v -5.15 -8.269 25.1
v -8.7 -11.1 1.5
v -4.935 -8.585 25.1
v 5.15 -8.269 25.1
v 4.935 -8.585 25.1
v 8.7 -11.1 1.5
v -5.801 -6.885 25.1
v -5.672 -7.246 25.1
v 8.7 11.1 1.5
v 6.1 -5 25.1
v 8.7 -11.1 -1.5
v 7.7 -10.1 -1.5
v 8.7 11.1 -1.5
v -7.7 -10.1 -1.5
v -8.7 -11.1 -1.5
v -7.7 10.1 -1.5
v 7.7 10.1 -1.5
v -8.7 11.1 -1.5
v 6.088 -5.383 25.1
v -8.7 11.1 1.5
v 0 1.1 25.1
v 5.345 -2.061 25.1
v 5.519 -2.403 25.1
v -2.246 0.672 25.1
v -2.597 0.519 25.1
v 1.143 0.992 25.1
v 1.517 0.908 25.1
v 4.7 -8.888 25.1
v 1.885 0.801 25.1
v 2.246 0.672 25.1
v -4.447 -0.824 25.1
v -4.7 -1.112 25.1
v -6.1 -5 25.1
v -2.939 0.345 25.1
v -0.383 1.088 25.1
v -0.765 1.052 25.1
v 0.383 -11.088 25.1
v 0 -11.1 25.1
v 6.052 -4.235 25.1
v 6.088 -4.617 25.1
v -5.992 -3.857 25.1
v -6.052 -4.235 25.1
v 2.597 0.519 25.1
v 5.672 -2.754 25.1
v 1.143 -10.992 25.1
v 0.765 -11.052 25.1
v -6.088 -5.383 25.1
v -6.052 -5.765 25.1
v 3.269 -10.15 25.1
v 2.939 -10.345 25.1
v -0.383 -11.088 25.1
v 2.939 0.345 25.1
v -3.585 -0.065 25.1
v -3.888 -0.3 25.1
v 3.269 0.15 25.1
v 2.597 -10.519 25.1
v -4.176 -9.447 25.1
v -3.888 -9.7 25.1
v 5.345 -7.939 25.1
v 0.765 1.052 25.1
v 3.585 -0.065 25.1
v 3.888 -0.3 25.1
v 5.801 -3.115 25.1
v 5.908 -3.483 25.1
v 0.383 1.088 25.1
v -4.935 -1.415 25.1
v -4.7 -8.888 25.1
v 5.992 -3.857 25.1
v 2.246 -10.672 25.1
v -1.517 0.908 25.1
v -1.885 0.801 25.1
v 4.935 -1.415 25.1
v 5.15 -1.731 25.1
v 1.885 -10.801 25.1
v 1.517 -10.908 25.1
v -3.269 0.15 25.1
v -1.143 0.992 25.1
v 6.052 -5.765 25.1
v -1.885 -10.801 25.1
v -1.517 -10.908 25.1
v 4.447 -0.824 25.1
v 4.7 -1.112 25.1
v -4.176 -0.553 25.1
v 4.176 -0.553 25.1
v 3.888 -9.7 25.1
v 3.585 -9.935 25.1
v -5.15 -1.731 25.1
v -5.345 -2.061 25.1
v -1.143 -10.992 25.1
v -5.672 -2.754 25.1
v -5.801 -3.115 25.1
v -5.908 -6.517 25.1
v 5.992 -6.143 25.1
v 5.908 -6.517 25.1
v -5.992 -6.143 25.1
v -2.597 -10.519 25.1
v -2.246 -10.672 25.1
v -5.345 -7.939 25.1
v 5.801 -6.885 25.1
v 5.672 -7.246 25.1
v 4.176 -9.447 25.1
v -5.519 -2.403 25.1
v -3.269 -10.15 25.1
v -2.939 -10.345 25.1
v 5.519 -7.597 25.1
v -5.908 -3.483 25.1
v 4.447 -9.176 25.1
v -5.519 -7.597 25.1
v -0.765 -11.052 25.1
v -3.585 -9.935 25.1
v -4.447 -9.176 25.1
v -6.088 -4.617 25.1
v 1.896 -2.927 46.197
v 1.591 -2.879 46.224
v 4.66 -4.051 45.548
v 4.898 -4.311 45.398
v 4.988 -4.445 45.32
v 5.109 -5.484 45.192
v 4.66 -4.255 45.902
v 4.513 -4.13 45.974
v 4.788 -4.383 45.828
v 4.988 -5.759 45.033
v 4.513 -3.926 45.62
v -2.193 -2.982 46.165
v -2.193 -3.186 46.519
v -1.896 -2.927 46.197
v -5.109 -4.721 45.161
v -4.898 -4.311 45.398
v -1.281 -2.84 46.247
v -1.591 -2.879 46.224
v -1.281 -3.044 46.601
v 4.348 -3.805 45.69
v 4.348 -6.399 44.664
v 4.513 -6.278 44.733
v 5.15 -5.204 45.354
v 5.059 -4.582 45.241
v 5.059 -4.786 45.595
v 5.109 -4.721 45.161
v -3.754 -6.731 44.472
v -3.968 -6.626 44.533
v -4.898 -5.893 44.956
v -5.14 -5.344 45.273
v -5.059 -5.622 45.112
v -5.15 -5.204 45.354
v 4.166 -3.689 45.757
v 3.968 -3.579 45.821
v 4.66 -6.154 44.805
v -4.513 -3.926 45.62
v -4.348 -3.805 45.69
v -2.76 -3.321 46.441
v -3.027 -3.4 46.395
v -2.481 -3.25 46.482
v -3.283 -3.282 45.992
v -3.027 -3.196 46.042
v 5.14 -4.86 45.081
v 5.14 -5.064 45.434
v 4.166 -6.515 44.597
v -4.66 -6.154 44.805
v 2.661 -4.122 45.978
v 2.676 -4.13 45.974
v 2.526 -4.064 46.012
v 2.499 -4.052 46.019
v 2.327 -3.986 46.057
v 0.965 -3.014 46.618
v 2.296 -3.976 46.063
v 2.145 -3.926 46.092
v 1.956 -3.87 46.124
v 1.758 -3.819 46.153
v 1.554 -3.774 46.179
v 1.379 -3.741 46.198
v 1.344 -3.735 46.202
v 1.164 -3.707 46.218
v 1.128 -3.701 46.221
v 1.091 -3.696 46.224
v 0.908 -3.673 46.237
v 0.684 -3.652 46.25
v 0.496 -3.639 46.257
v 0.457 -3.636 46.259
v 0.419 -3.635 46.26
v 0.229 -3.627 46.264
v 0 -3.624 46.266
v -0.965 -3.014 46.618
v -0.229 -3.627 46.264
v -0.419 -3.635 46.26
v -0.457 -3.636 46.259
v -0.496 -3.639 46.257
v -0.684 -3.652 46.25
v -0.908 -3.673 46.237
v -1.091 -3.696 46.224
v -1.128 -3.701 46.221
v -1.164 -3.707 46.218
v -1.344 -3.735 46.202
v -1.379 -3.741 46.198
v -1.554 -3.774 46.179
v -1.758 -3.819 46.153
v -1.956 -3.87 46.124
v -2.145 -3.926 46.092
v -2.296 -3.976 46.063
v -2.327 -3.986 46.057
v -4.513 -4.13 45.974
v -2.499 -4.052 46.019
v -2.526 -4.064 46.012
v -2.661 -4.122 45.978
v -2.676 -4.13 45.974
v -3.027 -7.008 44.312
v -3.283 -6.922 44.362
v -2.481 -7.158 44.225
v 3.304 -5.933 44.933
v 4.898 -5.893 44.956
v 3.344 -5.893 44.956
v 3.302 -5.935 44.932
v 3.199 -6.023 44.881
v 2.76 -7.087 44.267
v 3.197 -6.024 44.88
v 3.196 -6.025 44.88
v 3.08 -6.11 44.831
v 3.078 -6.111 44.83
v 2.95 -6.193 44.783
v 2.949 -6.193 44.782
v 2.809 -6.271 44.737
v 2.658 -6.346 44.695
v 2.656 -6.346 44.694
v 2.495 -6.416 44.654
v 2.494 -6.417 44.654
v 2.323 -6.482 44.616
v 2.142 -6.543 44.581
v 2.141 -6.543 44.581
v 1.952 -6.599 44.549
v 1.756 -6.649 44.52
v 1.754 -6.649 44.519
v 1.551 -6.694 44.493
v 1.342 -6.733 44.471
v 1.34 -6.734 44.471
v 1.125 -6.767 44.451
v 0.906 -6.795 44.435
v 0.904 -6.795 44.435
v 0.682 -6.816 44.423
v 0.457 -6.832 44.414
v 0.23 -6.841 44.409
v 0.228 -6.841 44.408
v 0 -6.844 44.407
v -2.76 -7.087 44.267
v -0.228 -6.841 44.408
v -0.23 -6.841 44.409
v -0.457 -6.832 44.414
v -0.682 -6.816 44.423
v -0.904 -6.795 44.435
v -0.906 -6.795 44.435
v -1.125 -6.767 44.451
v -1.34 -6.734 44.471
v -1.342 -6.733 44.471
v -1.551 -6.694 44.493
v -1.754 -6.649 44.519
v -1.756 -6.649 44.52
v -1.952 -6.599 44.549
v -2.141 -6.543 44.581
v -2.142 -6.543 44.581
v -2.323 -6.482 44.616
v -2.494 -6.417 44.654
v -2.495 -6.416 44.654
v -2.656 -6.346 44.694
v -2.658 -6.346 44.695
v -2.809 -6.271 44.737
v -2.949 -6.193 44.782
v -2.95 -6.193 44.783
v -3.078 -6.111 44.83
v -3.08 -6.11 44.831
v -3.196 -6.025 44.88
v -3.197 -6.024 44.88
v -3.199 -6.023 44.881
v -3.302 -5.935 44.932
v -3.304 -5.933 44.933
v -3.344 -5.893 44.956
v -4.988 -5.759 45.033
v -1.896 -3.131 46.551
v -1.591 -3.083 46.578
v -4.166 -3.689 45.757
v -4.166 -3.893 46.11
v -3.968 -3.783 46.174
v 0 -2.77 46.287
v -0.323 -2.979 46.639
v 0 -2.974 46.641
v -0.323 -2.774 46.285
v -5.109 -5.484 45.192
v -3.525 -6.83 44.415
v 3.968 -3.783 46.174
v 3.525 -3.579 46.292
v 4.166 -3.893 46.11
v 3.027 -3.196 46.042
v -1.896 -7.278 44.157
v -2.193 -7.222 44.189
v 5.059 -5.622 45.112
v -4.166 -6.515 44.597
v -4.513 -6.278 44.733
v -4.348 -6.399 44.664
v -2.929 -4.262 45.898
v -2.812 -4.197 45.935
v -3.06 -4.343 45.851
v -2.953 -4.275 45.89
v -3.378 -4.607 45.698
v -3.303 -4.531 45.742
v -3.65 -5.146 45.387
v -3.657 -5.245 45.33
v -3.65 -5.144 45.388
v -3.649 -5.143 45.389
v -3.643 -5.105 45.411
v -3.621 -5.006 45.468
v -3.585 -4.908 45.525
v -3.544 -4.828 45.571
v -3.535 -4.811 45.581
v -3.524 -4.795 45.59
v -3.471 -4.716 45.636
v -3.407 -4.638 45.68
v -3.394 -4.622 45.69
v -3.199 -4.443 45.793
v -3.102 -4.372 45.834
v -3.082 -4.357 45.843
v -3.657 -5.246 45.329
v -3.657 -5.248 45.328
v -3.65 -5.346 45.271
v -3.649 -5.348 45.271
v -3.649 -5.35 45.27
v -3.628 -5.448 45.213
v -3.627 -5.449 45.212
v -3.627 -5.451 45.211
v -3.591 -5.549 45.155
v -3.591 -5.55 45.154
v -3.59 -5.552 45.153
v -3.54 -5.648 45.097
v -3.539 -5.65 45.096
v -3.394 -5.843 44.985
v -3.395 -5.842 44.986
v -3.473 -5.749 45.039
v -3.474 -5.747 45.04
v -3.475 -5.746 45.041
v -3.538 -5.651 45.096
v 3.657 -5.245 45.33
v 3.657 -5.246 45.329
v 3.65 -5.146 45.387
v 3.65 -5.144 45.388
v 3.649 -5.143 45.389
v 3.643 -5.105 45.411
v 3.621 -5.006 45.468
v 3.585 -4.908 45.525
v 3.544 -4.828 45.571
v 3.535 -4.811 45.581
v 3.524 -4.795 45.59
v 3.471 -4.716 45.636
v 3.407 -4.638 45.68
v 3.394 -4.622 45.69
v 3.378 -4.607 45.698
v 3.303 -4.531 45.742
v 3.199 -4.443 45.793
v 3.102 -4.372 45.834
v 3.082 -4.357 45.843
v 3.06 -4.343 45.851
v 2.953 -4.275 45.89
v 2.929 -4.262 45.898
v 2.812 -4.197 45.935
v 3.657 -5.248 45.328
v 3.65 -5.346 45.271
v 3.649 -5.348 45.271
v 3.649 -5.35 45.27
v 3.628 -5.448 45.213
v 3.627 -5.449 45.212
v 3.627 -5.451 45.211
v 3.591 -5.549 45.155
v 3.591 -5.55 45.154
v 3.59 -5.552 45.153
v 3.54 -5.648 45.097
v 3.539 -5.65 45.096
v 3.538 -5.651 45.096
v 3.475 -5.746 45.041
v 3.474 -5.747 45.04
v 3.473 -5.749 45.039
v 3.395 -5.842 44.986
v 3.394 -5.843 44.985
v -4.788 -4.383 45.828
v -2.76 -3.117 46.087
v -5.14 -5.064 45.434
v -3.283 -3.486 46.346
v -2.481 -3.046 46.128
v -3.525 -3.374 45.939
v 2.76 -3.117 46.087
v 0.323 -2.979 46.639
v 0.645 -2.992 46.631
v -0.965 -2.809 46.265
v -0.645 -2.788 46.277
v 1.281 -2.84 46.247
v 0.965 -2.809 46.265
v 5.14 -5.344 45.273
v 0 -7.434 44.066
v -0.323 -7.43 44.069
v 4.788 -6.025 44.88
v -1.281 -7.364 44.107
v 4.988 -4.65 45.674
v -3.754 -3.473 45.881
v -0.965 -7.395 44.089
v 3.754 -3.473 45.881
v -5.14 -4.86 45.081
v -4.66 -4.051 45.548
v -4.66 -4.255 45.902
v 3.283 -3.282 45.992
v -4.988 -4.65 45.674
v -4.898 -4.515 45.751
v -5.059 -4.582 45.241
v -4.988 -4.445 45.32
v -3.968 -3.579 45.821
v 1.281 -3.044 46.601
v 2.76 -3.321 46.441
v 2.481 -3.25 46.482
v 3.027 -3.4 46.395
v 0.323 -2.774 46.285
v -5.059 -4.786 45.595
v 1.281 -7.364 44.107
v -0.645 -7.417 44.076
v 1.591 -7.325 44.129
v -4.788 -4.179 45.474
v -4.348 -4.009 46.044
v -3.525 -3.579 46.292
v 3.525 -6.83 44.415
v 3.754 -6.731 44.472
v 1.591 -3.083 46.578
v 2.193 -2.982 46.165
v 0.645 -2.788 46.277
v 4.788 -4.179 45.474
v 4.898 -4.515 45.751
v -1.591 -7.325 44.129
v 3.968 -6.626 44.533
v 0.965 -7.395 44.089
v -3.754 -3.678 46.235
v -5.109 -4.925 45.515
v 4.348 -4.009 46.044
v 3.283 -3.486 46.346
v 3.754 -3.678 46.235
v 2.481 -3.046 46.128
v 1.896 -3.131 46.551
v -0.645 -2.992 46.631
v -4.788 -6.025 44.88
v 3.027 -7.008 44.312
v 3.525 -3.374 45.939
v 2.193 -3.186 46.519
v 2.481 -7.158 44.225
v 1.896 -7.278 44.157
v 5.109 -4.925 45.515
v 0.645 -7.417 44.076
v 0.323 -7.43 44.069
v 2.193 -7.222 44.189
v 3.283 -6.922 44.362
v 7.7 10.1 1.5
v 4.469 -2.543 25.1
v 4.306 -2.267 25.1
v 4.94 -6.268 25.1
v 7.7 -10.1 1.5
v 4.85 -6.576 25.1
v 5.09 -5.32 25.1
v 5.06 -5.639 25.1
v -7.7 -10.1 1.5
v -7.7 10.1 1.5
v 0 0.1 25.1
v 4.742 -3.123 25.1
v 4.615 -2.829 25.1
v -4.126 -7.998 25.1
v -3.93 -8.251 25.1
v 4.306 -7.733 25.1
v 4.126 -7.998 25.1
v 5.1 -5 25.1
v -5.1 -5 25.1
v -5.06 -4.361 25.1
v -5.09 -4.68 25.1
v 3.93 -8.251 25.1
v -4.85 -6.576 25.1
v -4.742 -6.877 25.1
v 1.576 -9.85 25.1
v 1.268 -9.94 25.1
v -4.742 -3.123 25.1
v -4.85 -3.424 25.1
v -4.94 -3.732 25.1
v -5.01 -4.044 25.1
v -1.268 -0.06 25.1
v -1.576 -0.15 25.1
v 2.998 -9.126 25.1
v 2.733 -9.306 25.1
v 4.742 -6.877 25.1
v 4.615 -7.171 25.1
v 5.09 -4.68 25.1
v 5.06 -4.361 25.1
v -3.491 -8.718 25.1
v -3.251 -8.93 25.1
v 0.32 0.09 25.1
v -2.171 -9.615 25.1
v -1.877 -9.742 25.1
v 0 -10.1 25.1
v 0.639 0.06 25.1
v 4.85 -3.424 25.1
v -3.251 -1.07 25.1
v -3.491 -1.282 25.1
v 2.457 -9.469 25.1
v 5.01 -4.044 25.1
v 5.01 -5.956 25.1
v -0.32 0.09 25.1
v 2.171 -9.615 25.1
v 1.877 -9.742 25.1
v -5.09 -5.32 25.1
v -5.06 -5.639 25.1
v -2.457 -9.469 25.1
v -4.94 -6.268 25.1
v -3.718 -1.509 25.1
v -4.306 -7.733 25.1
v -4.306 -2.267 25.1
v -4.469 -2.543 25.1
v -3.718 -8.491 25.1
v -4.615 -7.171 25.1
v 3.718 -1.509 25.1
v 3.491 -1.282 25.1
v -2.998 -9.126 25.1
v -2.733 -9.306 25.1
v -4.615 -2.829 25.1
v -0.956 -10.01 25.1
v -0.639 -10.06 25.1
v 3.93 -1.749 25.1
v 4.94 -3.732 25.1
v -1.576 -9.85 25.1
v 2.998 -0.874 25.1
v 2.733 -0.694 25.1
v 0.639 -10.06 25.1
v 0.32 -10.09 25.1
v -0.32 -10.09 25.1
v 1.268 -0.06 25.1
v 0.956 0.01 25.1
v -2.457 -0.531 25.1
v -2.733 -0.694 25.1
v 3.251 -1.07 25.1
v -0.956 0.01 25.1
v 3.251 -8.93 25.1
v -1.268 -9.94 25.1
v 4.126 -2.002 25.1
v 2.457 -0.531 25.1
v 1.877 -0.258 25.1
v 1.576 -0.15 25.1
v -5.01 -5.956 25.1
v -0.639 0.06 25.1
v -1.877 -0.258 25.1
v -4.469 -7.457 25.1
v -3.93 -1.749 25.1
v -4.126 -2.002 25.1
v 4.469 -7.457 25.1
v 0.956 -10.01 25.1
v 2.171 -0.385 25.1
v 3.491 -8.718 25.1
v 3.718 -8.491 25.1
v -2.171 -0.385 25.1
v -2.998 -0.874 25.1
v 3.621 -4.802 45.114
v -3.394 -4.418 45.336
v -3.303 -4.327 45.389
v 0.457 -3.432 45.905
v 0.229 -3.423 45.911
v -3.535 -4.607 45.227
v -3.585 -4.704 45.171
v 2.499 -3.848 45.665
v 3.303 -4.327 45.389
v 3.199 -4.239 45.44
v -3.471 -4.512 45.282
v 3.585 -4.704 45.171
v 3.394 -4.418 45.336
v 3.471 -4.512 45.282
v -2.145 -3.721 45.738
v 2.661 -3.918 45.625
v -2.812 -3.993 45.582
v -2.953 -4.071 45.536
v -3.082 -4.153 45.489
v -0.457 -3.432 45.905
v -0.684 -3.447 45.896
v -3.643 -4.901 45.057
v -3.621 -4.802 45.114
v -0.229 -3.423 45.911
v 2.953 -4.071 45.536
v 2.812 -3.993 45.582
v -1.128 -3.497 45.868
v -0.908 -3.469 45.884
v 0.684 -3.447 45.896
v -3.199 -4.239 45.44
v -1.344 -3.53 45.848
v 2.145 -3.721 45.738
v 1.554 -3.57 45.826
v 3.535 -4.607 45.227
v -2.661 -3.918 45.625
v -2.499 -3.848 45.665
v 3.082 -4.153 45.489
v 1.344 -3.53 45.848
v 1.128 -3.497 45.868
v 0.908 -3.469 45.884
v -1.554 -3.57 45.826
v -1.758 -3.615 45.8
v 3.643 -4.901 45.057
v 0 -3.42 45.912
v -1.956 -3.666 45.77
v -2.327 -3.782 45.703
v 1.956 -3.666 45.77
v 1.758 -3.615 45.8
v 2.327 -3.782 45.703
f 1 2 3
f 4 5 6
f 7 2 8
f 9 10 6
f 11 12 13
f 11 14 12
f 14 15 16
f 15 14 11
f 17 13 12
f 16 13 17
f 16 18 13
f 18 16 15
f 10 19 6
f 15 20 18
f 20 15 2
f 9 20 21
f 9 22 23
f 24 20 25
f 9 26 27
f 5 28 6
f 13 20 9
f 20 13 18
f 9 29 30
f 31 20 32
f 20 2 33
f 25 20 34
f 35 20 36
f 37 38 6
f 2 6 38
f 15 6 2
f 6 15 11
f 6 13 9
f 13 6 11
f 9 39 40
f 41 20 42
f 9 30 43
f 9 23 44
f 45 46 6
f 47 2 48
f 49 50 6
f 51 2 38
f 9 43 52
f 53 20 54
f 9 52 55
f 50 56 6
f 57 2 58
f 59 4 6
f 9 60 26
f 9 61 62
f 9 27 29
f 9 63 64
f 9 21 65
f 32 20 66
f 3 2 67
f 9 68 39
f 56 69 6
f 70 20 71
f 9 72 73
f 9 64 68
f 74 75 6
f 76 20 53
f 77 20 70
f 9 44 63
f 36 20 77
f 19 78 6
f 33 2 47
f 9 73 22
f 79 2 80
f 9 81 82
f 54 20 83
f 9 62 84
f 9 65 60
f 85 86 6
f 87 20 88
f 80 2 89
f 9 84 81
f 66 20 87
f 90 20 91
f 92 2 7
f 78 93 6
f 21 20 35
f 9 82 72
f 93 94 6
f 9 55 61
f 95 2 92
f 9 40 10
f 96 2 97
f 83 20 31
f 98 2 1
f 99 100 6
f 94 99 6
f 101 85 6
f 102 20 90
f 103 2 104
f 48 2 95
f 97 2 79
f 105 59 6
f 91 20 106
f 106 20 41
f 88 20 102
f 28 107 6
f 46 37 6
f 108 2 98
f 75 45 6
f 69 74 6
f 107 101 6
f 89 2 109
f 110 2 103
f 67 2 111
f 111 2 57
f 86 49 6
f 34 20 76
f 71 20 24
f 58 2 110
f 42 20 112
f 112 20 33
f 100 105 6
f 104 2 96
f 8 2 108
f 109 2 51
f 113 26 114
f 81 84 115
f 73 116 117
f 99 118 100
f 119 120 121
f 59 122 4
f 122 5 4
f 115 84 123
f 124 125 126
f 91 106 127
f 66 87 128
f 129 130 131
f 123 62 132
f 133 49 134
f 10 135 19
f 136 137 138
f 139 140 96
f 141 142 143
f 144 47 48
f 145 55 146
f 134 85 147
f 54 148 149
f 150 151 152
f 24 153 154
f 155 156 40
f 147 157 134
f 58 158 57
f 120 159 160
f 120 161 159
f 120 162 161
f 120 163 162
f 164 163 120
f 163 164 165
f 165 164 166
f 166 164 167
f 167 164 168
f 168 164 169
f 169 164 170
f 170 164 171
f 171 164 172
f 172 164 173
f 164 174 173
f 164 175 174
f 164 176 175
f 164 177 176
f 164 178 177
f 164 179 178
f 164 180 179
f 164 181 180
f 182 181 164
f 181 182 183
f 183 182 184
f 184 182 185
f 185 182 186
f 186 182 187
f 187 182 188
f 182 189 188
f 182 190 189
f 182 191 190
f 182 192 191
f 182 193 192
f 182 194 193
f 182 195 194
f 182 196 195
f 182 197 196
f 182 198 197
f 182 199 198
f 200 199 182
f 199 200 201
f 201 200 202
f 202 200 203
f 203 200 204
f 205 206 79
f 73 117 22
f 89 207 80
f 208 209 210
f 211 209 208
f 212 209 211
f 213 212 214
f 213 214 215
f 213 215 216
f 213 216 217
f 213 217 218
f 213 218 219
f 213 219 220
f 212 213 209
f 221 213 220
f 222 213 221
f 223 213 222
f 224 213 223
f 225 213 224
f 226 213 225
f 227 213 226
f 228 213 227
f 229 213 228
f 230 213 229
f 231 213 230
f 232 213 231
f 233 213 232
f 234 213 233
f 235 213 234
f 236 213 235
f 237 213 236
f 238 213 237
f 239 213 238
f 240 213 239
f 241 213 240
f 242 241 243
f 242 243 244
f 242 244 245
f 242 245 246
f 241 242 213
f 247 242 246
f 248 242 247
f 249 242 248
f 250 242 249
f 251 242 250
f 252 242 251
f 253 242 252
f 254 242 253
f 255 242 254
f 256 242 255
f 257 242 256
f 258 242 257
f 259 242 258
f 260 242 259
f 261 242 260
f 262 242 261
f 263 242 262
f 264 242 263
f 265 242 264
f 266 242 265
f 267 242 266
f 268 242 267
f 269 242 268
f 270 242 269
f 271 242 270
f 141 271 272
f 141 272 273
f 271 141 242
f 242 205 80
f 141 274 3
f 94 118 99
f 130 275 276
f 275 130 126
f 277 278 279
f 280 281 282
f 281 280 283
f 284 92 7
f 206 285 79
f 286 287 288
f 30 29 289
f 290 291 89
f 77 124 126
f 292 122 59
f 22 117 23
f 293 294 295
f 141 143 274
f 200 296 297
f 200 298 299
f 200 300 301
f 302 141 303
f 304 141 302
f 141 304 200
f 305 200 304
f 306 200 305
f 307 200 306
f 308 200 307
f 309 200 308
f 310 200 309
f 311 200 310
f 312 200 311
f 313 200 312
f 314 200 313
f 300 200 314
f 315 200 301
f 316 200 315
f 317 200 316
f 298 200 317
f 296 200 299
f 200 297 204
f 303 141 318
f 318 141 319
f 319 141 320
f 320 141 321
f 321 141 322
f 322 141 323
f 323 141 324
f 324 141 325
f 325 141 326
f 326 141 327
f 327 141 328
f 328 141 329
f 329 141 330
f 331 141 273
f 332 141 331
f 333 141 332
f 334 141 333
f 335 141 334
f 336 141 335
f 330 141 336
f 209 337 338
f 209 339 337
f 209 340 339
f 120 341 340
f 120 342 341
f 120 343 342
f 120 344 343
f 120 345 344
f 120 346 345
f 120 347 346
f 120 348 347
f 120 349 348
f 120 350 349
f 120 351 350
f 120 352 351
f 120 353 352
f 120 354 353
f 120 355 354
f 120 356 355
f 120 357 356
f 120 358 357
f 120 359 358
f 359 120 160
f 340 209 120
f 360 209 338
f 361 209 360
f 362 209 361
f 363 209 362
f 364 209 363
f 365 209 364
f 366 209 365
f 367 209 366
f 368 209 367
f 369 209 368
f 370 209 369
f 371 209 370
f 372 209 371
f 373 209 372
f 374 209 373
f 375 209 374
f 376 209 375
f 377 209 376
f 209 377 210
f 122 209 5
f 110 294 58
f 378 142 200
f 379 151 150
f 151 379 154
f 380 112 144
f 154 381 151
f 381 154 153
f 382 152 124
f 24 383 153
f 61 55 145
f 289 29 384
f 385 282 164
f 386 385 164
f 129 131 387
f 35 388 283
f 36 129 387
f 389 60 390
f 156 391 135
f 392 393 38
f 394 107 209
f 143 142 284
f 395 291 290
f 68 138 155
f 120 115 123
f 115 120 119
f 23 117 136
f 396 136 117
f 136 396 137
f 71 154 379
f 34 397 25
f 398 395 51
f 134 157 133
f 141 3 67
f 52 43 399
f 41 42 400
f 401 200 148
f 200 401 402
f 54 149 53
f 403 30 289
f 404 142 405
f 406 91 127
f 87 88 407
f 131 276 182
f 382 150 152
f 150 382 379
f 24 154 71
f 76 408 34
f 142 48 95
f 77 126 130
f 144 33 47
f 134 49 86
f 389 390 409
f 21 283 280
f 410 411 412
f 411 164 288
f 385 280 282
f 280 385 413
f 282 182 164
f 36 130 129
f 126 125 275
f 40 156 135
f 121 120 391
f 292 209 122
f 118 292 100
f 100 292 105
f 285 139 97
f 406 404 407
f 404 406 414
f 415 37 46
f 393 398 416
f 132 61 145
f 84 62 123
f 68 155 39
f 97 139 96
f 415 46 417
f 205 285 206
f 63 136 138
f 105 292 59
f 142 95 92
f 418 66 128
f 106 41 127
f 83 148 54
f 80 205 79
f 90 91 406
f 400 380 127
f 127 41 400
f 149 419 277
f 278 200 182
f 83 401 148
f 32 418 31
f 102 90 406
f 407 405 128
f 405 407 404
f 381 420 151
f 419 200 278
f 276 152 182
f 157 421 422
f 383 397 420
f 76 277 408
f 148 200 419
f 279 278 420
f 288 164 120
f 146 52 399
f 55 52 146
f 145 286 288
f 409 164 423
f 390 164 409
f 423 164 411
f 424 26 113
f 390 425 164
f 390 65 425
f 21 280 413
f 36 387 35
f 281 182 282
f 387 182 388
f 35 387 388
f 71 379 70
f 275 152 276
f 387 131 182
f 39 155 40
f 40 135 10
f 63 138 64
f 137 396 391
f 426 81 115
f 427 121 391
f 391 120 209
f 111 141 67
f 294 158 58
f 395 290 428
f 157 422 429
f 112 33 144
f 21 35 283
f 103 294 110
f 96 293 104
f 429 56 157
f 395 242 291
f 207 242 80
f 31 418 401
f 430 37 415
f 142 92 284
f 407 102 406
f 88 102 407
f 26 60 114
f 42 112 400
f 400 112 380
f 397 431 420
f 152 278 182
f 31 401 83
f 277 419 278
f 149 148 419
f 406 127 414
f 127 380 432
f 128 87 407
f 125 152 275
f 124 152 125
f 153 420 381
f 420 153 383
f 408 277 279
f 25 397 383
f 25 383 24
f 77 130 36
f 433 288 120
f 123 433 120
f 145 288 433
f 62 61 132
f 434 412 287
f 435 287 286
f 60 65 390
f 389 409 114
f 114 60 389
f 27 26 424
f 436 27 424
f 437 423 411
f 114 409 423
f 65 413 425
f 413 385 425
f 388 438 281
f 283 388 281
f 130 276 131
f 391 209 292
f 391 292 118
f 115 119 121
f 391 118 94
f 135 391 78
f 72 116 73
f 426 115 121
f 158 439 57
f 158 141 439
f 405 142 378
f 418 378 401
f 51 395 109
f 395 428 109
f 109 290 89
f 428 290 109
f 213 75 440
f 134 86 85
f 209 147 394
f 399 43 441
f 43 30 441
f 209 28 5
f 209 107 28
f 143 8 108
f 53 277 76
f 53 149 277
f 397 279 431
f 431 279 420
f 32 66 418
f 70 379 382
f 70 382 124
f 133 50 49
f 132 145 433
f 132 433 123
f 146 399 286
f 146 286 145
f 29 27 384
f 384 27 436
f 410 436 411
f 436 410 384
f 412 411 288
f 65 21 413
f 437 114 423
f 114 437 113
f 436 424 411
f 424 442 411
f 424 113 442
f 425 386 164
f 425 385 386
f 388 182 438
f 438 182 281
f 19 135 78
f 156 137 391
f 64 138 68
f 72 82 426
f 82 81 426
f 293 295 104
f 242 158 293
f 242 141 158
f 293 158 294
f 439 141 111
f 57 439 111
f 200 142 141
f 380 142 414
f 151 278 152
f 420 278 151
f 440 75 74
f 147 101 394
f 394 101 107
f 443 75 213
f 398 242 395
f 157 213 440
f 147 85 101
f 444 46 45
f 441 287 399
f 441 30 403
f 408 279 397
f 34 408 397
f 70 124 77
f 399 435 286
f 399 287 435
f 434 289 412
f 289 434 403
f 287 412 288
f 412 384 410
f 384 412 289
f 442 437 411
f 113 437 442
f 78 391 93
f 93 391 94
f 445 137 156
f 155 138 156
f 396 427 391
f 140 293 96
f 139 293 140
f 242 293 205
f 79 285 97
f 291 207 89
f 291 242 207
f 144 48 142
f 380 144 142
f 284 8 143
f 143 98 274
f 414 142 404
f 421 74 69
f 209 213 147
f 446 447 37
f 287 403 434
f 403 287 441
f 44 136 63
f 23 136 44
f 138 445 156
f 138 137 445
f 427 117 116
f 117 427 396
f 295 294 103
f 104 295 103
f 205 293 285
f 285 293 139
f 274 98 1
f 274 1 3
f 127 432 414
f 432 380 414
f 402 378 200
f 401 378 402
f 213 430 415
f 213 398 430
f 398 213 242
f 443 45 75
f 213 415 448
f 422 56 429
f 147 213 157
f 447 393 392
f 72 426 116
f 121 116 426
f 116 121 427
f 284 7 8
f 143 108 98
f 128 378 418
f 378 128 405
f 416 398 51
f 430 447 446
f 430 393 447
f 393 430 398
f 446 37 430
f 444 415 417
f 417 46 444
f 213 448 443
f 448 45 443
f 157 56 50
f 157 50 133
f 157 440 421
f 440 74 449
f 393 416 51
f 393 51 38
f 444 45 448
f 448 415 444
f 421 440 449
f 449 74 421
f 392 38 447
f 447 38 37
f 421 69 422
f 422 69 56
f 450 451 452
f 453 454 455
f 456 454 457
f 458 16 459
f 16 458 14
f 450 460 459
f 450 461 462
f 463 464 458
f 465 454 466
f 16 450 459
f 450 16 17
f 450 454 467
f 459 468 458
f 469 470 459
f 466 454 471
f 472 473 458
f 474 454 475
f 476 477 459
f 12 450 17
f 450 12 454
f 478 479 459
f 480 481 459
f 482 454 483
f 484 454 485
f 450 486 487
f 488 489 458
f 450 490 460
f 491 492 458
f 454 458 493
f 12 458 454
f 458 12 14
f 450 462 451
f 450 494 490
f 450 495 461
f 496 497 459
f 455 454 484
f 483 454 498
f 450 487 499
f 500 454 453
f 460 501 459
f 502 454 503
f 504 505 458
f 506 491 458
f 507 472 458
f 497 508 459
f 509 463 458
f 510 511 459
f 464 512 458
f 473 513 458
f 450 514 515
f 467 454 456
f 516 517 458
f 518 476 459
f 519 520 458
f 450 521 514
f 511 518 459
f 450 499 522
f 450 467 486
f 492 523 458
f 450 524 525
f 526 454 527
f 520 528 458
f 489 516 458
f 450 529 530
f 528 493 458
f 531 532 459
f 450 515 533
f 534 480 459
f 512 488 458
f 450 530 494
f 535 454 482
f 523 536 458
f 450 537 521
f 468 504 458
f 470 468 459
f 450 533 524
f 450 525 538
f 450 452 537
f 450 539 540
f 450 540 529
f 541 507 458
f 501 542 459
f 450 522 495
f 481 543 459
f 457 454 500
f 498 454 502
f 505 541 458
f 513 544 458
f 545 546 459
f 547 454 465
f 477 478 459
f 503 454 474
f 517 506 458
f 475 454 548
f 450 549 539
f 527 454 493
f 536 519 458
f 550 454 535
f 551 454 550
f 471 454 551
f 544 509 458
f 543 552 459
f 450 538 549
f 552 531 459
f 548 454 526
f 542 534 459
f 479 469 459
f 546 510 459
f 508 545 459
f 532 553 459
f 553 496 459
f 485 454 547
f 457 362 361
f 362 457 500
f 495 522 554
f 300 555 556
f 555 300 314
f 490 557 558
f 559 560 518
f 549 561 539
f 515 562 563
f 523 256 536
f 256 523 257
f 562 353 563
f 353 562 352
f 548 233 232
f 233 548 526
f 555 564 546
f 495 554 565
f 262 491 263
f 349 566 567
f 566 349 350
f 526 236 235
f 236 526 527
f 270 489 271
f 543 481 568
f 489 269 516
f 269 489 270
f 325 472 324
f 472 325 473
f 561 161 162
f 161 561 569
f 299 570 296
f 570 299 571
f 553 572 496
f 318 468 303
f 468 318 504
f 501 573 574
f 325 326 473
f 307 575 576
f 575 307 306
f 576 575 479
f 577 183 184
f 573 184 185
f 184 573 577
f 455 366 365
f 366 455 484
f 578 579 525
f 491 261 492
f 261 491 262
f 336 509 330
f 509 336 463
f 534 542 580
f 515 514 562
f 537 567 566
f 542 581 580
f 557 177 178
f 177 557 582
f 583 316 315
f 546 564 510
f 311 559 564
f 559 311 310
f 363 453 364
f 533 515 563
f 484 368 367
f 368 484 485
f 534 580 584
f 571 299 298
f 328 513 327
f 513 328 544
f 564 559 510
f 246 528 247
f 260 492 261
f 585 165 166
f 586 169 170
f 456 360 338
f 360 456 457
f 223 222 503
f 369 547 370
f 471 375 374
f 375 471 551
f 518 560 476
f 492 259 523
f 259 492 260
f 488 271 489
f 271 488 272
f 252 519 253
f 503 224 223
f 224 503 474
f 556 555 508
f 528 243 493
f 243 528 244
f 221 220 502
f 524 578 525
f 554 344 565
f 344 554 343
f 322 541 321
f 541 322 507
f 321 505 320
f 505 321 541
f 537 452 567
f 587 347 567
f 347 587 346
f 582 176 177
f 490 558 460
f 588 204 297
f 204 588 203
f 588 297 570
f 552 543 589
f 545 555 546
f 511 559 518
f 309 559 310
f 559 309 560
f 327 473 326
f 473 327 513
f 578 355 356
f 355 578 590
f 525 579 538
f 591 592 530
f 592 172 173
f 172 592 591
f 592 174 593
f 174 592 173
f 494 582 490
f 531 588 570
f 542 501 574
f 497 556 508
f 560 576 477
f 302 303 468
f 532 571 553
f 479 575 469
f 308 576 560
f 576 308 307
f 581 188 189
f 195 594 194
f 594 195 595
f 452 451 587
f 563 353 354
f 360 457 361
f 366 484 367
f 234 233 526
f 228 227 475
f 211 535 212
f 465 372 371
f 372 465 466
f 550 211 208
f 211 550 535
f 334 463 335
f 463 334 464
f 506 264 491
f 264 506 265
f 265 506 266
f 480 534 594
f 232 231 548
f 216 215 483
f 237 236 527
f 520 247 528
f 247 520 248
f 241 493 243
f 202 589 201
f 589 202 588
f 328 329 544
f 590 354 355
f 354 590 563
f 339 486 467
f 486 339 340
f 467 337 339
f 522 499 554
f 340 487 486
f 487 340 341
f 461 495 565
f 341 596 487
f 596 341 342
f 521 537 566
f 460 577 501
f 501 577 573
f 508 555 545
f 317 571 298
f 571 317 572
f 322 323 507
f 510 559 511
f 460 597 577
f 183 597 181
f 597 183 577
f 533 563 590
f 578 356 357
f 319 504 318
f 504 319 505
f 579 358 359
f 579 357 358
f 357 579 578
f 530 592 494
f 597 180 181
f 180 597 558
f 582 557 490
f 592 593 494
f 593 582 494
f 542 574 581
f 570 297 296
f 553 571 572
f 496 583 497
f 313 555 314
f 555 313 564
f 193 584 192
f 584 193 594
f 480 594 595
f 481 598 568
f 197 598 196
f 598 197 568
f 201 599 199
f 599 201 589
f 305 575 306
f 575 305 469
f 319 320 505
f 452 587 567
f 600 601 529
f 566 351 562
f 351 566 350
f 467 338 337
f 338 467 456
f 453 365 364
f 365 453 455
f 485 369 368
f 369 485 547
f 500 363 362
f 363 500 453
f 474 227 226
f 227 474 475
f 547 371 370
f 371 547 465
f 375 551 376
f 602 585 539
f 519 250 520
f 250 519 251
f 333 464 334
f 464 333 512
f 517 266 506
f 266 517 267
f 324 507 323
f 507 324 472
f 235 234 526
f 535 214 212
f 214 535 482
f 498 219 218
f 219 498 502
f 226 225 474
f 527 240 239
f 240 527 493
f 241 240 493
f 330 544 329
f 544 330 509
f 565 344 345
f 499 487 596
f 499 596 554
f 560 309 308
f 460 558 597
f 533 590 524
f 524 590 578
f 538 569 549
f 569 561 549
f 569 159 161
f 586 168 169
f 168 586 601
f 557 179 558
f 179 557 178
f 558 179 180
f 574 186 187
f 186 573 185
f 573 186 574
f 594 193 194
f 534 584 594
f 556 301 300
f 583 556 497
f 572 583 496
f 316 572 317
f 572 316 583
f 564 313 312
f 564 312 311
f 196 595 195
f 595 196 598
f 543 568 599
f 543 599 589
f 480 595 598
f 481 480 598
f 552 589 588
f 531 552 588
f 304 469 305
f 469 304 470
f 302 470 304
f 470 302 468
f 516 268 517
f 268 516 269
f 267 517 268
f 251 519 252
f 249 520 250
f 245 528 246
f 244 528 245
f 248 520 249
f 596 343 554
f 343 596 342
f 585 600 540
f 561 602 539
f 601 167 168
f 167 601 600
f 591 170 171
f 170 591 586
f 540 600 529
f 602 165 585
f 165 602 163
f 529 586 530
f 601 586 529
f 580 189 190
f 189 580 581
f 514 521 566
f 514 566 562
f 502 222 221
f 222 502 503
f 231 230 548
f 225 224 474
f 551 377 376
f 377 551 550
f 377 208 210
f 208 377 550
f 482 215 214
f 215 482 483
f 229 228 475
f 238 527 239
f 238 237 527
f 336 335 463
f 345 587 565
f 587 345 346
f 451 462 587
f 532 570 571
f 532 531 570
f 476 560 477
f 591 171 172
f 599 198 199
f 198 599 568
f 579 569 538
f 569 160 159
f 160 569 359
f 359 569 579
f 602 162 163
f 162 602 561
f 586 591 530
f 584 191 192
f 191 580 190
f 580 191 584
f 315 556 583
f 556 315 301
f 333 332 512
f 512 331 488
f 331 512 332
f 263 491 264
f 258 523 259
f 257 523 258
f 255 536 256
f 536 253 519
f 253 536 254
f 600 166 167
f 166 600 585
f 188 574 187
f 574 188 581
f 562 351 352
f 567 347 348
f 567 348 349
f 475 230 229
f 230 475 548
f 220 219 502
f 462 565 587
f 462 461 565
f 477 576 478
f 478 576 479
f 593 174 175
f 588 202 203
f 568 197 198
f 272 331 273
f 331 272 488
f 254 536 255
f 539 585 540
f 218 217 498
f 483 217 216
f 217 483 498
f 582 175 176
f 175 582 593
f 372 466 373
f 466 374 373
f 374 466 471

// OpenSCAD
// http://www.thingiverse.com/thing:387301

$fn=100;

$fs=0.1;
module FanDuct() {
	tol=0.10;
	wallThickness=1;//0.8;

	module Shape(dia) {
		hull() {
			cube([15.2+dia*2,20+dia*2,3],center=true);
			translate([0,-5,25])cylinder(h=0.1,d=10+dia*2);
		}
		hull() {
			translate([0,-5,25])cylinder(h=0.1,d=10+dia*2);
			translate([0,-5,45])rotate([30,0,0])scale([1.0,0.5,1])cylinder(h=0.5-dia/12,d=7+dia*3);
		}
	}

	difference() {
		Shape(dia=wallThickness+tol);
		Shape(dia=tol);
	}
}


FanDuct();
